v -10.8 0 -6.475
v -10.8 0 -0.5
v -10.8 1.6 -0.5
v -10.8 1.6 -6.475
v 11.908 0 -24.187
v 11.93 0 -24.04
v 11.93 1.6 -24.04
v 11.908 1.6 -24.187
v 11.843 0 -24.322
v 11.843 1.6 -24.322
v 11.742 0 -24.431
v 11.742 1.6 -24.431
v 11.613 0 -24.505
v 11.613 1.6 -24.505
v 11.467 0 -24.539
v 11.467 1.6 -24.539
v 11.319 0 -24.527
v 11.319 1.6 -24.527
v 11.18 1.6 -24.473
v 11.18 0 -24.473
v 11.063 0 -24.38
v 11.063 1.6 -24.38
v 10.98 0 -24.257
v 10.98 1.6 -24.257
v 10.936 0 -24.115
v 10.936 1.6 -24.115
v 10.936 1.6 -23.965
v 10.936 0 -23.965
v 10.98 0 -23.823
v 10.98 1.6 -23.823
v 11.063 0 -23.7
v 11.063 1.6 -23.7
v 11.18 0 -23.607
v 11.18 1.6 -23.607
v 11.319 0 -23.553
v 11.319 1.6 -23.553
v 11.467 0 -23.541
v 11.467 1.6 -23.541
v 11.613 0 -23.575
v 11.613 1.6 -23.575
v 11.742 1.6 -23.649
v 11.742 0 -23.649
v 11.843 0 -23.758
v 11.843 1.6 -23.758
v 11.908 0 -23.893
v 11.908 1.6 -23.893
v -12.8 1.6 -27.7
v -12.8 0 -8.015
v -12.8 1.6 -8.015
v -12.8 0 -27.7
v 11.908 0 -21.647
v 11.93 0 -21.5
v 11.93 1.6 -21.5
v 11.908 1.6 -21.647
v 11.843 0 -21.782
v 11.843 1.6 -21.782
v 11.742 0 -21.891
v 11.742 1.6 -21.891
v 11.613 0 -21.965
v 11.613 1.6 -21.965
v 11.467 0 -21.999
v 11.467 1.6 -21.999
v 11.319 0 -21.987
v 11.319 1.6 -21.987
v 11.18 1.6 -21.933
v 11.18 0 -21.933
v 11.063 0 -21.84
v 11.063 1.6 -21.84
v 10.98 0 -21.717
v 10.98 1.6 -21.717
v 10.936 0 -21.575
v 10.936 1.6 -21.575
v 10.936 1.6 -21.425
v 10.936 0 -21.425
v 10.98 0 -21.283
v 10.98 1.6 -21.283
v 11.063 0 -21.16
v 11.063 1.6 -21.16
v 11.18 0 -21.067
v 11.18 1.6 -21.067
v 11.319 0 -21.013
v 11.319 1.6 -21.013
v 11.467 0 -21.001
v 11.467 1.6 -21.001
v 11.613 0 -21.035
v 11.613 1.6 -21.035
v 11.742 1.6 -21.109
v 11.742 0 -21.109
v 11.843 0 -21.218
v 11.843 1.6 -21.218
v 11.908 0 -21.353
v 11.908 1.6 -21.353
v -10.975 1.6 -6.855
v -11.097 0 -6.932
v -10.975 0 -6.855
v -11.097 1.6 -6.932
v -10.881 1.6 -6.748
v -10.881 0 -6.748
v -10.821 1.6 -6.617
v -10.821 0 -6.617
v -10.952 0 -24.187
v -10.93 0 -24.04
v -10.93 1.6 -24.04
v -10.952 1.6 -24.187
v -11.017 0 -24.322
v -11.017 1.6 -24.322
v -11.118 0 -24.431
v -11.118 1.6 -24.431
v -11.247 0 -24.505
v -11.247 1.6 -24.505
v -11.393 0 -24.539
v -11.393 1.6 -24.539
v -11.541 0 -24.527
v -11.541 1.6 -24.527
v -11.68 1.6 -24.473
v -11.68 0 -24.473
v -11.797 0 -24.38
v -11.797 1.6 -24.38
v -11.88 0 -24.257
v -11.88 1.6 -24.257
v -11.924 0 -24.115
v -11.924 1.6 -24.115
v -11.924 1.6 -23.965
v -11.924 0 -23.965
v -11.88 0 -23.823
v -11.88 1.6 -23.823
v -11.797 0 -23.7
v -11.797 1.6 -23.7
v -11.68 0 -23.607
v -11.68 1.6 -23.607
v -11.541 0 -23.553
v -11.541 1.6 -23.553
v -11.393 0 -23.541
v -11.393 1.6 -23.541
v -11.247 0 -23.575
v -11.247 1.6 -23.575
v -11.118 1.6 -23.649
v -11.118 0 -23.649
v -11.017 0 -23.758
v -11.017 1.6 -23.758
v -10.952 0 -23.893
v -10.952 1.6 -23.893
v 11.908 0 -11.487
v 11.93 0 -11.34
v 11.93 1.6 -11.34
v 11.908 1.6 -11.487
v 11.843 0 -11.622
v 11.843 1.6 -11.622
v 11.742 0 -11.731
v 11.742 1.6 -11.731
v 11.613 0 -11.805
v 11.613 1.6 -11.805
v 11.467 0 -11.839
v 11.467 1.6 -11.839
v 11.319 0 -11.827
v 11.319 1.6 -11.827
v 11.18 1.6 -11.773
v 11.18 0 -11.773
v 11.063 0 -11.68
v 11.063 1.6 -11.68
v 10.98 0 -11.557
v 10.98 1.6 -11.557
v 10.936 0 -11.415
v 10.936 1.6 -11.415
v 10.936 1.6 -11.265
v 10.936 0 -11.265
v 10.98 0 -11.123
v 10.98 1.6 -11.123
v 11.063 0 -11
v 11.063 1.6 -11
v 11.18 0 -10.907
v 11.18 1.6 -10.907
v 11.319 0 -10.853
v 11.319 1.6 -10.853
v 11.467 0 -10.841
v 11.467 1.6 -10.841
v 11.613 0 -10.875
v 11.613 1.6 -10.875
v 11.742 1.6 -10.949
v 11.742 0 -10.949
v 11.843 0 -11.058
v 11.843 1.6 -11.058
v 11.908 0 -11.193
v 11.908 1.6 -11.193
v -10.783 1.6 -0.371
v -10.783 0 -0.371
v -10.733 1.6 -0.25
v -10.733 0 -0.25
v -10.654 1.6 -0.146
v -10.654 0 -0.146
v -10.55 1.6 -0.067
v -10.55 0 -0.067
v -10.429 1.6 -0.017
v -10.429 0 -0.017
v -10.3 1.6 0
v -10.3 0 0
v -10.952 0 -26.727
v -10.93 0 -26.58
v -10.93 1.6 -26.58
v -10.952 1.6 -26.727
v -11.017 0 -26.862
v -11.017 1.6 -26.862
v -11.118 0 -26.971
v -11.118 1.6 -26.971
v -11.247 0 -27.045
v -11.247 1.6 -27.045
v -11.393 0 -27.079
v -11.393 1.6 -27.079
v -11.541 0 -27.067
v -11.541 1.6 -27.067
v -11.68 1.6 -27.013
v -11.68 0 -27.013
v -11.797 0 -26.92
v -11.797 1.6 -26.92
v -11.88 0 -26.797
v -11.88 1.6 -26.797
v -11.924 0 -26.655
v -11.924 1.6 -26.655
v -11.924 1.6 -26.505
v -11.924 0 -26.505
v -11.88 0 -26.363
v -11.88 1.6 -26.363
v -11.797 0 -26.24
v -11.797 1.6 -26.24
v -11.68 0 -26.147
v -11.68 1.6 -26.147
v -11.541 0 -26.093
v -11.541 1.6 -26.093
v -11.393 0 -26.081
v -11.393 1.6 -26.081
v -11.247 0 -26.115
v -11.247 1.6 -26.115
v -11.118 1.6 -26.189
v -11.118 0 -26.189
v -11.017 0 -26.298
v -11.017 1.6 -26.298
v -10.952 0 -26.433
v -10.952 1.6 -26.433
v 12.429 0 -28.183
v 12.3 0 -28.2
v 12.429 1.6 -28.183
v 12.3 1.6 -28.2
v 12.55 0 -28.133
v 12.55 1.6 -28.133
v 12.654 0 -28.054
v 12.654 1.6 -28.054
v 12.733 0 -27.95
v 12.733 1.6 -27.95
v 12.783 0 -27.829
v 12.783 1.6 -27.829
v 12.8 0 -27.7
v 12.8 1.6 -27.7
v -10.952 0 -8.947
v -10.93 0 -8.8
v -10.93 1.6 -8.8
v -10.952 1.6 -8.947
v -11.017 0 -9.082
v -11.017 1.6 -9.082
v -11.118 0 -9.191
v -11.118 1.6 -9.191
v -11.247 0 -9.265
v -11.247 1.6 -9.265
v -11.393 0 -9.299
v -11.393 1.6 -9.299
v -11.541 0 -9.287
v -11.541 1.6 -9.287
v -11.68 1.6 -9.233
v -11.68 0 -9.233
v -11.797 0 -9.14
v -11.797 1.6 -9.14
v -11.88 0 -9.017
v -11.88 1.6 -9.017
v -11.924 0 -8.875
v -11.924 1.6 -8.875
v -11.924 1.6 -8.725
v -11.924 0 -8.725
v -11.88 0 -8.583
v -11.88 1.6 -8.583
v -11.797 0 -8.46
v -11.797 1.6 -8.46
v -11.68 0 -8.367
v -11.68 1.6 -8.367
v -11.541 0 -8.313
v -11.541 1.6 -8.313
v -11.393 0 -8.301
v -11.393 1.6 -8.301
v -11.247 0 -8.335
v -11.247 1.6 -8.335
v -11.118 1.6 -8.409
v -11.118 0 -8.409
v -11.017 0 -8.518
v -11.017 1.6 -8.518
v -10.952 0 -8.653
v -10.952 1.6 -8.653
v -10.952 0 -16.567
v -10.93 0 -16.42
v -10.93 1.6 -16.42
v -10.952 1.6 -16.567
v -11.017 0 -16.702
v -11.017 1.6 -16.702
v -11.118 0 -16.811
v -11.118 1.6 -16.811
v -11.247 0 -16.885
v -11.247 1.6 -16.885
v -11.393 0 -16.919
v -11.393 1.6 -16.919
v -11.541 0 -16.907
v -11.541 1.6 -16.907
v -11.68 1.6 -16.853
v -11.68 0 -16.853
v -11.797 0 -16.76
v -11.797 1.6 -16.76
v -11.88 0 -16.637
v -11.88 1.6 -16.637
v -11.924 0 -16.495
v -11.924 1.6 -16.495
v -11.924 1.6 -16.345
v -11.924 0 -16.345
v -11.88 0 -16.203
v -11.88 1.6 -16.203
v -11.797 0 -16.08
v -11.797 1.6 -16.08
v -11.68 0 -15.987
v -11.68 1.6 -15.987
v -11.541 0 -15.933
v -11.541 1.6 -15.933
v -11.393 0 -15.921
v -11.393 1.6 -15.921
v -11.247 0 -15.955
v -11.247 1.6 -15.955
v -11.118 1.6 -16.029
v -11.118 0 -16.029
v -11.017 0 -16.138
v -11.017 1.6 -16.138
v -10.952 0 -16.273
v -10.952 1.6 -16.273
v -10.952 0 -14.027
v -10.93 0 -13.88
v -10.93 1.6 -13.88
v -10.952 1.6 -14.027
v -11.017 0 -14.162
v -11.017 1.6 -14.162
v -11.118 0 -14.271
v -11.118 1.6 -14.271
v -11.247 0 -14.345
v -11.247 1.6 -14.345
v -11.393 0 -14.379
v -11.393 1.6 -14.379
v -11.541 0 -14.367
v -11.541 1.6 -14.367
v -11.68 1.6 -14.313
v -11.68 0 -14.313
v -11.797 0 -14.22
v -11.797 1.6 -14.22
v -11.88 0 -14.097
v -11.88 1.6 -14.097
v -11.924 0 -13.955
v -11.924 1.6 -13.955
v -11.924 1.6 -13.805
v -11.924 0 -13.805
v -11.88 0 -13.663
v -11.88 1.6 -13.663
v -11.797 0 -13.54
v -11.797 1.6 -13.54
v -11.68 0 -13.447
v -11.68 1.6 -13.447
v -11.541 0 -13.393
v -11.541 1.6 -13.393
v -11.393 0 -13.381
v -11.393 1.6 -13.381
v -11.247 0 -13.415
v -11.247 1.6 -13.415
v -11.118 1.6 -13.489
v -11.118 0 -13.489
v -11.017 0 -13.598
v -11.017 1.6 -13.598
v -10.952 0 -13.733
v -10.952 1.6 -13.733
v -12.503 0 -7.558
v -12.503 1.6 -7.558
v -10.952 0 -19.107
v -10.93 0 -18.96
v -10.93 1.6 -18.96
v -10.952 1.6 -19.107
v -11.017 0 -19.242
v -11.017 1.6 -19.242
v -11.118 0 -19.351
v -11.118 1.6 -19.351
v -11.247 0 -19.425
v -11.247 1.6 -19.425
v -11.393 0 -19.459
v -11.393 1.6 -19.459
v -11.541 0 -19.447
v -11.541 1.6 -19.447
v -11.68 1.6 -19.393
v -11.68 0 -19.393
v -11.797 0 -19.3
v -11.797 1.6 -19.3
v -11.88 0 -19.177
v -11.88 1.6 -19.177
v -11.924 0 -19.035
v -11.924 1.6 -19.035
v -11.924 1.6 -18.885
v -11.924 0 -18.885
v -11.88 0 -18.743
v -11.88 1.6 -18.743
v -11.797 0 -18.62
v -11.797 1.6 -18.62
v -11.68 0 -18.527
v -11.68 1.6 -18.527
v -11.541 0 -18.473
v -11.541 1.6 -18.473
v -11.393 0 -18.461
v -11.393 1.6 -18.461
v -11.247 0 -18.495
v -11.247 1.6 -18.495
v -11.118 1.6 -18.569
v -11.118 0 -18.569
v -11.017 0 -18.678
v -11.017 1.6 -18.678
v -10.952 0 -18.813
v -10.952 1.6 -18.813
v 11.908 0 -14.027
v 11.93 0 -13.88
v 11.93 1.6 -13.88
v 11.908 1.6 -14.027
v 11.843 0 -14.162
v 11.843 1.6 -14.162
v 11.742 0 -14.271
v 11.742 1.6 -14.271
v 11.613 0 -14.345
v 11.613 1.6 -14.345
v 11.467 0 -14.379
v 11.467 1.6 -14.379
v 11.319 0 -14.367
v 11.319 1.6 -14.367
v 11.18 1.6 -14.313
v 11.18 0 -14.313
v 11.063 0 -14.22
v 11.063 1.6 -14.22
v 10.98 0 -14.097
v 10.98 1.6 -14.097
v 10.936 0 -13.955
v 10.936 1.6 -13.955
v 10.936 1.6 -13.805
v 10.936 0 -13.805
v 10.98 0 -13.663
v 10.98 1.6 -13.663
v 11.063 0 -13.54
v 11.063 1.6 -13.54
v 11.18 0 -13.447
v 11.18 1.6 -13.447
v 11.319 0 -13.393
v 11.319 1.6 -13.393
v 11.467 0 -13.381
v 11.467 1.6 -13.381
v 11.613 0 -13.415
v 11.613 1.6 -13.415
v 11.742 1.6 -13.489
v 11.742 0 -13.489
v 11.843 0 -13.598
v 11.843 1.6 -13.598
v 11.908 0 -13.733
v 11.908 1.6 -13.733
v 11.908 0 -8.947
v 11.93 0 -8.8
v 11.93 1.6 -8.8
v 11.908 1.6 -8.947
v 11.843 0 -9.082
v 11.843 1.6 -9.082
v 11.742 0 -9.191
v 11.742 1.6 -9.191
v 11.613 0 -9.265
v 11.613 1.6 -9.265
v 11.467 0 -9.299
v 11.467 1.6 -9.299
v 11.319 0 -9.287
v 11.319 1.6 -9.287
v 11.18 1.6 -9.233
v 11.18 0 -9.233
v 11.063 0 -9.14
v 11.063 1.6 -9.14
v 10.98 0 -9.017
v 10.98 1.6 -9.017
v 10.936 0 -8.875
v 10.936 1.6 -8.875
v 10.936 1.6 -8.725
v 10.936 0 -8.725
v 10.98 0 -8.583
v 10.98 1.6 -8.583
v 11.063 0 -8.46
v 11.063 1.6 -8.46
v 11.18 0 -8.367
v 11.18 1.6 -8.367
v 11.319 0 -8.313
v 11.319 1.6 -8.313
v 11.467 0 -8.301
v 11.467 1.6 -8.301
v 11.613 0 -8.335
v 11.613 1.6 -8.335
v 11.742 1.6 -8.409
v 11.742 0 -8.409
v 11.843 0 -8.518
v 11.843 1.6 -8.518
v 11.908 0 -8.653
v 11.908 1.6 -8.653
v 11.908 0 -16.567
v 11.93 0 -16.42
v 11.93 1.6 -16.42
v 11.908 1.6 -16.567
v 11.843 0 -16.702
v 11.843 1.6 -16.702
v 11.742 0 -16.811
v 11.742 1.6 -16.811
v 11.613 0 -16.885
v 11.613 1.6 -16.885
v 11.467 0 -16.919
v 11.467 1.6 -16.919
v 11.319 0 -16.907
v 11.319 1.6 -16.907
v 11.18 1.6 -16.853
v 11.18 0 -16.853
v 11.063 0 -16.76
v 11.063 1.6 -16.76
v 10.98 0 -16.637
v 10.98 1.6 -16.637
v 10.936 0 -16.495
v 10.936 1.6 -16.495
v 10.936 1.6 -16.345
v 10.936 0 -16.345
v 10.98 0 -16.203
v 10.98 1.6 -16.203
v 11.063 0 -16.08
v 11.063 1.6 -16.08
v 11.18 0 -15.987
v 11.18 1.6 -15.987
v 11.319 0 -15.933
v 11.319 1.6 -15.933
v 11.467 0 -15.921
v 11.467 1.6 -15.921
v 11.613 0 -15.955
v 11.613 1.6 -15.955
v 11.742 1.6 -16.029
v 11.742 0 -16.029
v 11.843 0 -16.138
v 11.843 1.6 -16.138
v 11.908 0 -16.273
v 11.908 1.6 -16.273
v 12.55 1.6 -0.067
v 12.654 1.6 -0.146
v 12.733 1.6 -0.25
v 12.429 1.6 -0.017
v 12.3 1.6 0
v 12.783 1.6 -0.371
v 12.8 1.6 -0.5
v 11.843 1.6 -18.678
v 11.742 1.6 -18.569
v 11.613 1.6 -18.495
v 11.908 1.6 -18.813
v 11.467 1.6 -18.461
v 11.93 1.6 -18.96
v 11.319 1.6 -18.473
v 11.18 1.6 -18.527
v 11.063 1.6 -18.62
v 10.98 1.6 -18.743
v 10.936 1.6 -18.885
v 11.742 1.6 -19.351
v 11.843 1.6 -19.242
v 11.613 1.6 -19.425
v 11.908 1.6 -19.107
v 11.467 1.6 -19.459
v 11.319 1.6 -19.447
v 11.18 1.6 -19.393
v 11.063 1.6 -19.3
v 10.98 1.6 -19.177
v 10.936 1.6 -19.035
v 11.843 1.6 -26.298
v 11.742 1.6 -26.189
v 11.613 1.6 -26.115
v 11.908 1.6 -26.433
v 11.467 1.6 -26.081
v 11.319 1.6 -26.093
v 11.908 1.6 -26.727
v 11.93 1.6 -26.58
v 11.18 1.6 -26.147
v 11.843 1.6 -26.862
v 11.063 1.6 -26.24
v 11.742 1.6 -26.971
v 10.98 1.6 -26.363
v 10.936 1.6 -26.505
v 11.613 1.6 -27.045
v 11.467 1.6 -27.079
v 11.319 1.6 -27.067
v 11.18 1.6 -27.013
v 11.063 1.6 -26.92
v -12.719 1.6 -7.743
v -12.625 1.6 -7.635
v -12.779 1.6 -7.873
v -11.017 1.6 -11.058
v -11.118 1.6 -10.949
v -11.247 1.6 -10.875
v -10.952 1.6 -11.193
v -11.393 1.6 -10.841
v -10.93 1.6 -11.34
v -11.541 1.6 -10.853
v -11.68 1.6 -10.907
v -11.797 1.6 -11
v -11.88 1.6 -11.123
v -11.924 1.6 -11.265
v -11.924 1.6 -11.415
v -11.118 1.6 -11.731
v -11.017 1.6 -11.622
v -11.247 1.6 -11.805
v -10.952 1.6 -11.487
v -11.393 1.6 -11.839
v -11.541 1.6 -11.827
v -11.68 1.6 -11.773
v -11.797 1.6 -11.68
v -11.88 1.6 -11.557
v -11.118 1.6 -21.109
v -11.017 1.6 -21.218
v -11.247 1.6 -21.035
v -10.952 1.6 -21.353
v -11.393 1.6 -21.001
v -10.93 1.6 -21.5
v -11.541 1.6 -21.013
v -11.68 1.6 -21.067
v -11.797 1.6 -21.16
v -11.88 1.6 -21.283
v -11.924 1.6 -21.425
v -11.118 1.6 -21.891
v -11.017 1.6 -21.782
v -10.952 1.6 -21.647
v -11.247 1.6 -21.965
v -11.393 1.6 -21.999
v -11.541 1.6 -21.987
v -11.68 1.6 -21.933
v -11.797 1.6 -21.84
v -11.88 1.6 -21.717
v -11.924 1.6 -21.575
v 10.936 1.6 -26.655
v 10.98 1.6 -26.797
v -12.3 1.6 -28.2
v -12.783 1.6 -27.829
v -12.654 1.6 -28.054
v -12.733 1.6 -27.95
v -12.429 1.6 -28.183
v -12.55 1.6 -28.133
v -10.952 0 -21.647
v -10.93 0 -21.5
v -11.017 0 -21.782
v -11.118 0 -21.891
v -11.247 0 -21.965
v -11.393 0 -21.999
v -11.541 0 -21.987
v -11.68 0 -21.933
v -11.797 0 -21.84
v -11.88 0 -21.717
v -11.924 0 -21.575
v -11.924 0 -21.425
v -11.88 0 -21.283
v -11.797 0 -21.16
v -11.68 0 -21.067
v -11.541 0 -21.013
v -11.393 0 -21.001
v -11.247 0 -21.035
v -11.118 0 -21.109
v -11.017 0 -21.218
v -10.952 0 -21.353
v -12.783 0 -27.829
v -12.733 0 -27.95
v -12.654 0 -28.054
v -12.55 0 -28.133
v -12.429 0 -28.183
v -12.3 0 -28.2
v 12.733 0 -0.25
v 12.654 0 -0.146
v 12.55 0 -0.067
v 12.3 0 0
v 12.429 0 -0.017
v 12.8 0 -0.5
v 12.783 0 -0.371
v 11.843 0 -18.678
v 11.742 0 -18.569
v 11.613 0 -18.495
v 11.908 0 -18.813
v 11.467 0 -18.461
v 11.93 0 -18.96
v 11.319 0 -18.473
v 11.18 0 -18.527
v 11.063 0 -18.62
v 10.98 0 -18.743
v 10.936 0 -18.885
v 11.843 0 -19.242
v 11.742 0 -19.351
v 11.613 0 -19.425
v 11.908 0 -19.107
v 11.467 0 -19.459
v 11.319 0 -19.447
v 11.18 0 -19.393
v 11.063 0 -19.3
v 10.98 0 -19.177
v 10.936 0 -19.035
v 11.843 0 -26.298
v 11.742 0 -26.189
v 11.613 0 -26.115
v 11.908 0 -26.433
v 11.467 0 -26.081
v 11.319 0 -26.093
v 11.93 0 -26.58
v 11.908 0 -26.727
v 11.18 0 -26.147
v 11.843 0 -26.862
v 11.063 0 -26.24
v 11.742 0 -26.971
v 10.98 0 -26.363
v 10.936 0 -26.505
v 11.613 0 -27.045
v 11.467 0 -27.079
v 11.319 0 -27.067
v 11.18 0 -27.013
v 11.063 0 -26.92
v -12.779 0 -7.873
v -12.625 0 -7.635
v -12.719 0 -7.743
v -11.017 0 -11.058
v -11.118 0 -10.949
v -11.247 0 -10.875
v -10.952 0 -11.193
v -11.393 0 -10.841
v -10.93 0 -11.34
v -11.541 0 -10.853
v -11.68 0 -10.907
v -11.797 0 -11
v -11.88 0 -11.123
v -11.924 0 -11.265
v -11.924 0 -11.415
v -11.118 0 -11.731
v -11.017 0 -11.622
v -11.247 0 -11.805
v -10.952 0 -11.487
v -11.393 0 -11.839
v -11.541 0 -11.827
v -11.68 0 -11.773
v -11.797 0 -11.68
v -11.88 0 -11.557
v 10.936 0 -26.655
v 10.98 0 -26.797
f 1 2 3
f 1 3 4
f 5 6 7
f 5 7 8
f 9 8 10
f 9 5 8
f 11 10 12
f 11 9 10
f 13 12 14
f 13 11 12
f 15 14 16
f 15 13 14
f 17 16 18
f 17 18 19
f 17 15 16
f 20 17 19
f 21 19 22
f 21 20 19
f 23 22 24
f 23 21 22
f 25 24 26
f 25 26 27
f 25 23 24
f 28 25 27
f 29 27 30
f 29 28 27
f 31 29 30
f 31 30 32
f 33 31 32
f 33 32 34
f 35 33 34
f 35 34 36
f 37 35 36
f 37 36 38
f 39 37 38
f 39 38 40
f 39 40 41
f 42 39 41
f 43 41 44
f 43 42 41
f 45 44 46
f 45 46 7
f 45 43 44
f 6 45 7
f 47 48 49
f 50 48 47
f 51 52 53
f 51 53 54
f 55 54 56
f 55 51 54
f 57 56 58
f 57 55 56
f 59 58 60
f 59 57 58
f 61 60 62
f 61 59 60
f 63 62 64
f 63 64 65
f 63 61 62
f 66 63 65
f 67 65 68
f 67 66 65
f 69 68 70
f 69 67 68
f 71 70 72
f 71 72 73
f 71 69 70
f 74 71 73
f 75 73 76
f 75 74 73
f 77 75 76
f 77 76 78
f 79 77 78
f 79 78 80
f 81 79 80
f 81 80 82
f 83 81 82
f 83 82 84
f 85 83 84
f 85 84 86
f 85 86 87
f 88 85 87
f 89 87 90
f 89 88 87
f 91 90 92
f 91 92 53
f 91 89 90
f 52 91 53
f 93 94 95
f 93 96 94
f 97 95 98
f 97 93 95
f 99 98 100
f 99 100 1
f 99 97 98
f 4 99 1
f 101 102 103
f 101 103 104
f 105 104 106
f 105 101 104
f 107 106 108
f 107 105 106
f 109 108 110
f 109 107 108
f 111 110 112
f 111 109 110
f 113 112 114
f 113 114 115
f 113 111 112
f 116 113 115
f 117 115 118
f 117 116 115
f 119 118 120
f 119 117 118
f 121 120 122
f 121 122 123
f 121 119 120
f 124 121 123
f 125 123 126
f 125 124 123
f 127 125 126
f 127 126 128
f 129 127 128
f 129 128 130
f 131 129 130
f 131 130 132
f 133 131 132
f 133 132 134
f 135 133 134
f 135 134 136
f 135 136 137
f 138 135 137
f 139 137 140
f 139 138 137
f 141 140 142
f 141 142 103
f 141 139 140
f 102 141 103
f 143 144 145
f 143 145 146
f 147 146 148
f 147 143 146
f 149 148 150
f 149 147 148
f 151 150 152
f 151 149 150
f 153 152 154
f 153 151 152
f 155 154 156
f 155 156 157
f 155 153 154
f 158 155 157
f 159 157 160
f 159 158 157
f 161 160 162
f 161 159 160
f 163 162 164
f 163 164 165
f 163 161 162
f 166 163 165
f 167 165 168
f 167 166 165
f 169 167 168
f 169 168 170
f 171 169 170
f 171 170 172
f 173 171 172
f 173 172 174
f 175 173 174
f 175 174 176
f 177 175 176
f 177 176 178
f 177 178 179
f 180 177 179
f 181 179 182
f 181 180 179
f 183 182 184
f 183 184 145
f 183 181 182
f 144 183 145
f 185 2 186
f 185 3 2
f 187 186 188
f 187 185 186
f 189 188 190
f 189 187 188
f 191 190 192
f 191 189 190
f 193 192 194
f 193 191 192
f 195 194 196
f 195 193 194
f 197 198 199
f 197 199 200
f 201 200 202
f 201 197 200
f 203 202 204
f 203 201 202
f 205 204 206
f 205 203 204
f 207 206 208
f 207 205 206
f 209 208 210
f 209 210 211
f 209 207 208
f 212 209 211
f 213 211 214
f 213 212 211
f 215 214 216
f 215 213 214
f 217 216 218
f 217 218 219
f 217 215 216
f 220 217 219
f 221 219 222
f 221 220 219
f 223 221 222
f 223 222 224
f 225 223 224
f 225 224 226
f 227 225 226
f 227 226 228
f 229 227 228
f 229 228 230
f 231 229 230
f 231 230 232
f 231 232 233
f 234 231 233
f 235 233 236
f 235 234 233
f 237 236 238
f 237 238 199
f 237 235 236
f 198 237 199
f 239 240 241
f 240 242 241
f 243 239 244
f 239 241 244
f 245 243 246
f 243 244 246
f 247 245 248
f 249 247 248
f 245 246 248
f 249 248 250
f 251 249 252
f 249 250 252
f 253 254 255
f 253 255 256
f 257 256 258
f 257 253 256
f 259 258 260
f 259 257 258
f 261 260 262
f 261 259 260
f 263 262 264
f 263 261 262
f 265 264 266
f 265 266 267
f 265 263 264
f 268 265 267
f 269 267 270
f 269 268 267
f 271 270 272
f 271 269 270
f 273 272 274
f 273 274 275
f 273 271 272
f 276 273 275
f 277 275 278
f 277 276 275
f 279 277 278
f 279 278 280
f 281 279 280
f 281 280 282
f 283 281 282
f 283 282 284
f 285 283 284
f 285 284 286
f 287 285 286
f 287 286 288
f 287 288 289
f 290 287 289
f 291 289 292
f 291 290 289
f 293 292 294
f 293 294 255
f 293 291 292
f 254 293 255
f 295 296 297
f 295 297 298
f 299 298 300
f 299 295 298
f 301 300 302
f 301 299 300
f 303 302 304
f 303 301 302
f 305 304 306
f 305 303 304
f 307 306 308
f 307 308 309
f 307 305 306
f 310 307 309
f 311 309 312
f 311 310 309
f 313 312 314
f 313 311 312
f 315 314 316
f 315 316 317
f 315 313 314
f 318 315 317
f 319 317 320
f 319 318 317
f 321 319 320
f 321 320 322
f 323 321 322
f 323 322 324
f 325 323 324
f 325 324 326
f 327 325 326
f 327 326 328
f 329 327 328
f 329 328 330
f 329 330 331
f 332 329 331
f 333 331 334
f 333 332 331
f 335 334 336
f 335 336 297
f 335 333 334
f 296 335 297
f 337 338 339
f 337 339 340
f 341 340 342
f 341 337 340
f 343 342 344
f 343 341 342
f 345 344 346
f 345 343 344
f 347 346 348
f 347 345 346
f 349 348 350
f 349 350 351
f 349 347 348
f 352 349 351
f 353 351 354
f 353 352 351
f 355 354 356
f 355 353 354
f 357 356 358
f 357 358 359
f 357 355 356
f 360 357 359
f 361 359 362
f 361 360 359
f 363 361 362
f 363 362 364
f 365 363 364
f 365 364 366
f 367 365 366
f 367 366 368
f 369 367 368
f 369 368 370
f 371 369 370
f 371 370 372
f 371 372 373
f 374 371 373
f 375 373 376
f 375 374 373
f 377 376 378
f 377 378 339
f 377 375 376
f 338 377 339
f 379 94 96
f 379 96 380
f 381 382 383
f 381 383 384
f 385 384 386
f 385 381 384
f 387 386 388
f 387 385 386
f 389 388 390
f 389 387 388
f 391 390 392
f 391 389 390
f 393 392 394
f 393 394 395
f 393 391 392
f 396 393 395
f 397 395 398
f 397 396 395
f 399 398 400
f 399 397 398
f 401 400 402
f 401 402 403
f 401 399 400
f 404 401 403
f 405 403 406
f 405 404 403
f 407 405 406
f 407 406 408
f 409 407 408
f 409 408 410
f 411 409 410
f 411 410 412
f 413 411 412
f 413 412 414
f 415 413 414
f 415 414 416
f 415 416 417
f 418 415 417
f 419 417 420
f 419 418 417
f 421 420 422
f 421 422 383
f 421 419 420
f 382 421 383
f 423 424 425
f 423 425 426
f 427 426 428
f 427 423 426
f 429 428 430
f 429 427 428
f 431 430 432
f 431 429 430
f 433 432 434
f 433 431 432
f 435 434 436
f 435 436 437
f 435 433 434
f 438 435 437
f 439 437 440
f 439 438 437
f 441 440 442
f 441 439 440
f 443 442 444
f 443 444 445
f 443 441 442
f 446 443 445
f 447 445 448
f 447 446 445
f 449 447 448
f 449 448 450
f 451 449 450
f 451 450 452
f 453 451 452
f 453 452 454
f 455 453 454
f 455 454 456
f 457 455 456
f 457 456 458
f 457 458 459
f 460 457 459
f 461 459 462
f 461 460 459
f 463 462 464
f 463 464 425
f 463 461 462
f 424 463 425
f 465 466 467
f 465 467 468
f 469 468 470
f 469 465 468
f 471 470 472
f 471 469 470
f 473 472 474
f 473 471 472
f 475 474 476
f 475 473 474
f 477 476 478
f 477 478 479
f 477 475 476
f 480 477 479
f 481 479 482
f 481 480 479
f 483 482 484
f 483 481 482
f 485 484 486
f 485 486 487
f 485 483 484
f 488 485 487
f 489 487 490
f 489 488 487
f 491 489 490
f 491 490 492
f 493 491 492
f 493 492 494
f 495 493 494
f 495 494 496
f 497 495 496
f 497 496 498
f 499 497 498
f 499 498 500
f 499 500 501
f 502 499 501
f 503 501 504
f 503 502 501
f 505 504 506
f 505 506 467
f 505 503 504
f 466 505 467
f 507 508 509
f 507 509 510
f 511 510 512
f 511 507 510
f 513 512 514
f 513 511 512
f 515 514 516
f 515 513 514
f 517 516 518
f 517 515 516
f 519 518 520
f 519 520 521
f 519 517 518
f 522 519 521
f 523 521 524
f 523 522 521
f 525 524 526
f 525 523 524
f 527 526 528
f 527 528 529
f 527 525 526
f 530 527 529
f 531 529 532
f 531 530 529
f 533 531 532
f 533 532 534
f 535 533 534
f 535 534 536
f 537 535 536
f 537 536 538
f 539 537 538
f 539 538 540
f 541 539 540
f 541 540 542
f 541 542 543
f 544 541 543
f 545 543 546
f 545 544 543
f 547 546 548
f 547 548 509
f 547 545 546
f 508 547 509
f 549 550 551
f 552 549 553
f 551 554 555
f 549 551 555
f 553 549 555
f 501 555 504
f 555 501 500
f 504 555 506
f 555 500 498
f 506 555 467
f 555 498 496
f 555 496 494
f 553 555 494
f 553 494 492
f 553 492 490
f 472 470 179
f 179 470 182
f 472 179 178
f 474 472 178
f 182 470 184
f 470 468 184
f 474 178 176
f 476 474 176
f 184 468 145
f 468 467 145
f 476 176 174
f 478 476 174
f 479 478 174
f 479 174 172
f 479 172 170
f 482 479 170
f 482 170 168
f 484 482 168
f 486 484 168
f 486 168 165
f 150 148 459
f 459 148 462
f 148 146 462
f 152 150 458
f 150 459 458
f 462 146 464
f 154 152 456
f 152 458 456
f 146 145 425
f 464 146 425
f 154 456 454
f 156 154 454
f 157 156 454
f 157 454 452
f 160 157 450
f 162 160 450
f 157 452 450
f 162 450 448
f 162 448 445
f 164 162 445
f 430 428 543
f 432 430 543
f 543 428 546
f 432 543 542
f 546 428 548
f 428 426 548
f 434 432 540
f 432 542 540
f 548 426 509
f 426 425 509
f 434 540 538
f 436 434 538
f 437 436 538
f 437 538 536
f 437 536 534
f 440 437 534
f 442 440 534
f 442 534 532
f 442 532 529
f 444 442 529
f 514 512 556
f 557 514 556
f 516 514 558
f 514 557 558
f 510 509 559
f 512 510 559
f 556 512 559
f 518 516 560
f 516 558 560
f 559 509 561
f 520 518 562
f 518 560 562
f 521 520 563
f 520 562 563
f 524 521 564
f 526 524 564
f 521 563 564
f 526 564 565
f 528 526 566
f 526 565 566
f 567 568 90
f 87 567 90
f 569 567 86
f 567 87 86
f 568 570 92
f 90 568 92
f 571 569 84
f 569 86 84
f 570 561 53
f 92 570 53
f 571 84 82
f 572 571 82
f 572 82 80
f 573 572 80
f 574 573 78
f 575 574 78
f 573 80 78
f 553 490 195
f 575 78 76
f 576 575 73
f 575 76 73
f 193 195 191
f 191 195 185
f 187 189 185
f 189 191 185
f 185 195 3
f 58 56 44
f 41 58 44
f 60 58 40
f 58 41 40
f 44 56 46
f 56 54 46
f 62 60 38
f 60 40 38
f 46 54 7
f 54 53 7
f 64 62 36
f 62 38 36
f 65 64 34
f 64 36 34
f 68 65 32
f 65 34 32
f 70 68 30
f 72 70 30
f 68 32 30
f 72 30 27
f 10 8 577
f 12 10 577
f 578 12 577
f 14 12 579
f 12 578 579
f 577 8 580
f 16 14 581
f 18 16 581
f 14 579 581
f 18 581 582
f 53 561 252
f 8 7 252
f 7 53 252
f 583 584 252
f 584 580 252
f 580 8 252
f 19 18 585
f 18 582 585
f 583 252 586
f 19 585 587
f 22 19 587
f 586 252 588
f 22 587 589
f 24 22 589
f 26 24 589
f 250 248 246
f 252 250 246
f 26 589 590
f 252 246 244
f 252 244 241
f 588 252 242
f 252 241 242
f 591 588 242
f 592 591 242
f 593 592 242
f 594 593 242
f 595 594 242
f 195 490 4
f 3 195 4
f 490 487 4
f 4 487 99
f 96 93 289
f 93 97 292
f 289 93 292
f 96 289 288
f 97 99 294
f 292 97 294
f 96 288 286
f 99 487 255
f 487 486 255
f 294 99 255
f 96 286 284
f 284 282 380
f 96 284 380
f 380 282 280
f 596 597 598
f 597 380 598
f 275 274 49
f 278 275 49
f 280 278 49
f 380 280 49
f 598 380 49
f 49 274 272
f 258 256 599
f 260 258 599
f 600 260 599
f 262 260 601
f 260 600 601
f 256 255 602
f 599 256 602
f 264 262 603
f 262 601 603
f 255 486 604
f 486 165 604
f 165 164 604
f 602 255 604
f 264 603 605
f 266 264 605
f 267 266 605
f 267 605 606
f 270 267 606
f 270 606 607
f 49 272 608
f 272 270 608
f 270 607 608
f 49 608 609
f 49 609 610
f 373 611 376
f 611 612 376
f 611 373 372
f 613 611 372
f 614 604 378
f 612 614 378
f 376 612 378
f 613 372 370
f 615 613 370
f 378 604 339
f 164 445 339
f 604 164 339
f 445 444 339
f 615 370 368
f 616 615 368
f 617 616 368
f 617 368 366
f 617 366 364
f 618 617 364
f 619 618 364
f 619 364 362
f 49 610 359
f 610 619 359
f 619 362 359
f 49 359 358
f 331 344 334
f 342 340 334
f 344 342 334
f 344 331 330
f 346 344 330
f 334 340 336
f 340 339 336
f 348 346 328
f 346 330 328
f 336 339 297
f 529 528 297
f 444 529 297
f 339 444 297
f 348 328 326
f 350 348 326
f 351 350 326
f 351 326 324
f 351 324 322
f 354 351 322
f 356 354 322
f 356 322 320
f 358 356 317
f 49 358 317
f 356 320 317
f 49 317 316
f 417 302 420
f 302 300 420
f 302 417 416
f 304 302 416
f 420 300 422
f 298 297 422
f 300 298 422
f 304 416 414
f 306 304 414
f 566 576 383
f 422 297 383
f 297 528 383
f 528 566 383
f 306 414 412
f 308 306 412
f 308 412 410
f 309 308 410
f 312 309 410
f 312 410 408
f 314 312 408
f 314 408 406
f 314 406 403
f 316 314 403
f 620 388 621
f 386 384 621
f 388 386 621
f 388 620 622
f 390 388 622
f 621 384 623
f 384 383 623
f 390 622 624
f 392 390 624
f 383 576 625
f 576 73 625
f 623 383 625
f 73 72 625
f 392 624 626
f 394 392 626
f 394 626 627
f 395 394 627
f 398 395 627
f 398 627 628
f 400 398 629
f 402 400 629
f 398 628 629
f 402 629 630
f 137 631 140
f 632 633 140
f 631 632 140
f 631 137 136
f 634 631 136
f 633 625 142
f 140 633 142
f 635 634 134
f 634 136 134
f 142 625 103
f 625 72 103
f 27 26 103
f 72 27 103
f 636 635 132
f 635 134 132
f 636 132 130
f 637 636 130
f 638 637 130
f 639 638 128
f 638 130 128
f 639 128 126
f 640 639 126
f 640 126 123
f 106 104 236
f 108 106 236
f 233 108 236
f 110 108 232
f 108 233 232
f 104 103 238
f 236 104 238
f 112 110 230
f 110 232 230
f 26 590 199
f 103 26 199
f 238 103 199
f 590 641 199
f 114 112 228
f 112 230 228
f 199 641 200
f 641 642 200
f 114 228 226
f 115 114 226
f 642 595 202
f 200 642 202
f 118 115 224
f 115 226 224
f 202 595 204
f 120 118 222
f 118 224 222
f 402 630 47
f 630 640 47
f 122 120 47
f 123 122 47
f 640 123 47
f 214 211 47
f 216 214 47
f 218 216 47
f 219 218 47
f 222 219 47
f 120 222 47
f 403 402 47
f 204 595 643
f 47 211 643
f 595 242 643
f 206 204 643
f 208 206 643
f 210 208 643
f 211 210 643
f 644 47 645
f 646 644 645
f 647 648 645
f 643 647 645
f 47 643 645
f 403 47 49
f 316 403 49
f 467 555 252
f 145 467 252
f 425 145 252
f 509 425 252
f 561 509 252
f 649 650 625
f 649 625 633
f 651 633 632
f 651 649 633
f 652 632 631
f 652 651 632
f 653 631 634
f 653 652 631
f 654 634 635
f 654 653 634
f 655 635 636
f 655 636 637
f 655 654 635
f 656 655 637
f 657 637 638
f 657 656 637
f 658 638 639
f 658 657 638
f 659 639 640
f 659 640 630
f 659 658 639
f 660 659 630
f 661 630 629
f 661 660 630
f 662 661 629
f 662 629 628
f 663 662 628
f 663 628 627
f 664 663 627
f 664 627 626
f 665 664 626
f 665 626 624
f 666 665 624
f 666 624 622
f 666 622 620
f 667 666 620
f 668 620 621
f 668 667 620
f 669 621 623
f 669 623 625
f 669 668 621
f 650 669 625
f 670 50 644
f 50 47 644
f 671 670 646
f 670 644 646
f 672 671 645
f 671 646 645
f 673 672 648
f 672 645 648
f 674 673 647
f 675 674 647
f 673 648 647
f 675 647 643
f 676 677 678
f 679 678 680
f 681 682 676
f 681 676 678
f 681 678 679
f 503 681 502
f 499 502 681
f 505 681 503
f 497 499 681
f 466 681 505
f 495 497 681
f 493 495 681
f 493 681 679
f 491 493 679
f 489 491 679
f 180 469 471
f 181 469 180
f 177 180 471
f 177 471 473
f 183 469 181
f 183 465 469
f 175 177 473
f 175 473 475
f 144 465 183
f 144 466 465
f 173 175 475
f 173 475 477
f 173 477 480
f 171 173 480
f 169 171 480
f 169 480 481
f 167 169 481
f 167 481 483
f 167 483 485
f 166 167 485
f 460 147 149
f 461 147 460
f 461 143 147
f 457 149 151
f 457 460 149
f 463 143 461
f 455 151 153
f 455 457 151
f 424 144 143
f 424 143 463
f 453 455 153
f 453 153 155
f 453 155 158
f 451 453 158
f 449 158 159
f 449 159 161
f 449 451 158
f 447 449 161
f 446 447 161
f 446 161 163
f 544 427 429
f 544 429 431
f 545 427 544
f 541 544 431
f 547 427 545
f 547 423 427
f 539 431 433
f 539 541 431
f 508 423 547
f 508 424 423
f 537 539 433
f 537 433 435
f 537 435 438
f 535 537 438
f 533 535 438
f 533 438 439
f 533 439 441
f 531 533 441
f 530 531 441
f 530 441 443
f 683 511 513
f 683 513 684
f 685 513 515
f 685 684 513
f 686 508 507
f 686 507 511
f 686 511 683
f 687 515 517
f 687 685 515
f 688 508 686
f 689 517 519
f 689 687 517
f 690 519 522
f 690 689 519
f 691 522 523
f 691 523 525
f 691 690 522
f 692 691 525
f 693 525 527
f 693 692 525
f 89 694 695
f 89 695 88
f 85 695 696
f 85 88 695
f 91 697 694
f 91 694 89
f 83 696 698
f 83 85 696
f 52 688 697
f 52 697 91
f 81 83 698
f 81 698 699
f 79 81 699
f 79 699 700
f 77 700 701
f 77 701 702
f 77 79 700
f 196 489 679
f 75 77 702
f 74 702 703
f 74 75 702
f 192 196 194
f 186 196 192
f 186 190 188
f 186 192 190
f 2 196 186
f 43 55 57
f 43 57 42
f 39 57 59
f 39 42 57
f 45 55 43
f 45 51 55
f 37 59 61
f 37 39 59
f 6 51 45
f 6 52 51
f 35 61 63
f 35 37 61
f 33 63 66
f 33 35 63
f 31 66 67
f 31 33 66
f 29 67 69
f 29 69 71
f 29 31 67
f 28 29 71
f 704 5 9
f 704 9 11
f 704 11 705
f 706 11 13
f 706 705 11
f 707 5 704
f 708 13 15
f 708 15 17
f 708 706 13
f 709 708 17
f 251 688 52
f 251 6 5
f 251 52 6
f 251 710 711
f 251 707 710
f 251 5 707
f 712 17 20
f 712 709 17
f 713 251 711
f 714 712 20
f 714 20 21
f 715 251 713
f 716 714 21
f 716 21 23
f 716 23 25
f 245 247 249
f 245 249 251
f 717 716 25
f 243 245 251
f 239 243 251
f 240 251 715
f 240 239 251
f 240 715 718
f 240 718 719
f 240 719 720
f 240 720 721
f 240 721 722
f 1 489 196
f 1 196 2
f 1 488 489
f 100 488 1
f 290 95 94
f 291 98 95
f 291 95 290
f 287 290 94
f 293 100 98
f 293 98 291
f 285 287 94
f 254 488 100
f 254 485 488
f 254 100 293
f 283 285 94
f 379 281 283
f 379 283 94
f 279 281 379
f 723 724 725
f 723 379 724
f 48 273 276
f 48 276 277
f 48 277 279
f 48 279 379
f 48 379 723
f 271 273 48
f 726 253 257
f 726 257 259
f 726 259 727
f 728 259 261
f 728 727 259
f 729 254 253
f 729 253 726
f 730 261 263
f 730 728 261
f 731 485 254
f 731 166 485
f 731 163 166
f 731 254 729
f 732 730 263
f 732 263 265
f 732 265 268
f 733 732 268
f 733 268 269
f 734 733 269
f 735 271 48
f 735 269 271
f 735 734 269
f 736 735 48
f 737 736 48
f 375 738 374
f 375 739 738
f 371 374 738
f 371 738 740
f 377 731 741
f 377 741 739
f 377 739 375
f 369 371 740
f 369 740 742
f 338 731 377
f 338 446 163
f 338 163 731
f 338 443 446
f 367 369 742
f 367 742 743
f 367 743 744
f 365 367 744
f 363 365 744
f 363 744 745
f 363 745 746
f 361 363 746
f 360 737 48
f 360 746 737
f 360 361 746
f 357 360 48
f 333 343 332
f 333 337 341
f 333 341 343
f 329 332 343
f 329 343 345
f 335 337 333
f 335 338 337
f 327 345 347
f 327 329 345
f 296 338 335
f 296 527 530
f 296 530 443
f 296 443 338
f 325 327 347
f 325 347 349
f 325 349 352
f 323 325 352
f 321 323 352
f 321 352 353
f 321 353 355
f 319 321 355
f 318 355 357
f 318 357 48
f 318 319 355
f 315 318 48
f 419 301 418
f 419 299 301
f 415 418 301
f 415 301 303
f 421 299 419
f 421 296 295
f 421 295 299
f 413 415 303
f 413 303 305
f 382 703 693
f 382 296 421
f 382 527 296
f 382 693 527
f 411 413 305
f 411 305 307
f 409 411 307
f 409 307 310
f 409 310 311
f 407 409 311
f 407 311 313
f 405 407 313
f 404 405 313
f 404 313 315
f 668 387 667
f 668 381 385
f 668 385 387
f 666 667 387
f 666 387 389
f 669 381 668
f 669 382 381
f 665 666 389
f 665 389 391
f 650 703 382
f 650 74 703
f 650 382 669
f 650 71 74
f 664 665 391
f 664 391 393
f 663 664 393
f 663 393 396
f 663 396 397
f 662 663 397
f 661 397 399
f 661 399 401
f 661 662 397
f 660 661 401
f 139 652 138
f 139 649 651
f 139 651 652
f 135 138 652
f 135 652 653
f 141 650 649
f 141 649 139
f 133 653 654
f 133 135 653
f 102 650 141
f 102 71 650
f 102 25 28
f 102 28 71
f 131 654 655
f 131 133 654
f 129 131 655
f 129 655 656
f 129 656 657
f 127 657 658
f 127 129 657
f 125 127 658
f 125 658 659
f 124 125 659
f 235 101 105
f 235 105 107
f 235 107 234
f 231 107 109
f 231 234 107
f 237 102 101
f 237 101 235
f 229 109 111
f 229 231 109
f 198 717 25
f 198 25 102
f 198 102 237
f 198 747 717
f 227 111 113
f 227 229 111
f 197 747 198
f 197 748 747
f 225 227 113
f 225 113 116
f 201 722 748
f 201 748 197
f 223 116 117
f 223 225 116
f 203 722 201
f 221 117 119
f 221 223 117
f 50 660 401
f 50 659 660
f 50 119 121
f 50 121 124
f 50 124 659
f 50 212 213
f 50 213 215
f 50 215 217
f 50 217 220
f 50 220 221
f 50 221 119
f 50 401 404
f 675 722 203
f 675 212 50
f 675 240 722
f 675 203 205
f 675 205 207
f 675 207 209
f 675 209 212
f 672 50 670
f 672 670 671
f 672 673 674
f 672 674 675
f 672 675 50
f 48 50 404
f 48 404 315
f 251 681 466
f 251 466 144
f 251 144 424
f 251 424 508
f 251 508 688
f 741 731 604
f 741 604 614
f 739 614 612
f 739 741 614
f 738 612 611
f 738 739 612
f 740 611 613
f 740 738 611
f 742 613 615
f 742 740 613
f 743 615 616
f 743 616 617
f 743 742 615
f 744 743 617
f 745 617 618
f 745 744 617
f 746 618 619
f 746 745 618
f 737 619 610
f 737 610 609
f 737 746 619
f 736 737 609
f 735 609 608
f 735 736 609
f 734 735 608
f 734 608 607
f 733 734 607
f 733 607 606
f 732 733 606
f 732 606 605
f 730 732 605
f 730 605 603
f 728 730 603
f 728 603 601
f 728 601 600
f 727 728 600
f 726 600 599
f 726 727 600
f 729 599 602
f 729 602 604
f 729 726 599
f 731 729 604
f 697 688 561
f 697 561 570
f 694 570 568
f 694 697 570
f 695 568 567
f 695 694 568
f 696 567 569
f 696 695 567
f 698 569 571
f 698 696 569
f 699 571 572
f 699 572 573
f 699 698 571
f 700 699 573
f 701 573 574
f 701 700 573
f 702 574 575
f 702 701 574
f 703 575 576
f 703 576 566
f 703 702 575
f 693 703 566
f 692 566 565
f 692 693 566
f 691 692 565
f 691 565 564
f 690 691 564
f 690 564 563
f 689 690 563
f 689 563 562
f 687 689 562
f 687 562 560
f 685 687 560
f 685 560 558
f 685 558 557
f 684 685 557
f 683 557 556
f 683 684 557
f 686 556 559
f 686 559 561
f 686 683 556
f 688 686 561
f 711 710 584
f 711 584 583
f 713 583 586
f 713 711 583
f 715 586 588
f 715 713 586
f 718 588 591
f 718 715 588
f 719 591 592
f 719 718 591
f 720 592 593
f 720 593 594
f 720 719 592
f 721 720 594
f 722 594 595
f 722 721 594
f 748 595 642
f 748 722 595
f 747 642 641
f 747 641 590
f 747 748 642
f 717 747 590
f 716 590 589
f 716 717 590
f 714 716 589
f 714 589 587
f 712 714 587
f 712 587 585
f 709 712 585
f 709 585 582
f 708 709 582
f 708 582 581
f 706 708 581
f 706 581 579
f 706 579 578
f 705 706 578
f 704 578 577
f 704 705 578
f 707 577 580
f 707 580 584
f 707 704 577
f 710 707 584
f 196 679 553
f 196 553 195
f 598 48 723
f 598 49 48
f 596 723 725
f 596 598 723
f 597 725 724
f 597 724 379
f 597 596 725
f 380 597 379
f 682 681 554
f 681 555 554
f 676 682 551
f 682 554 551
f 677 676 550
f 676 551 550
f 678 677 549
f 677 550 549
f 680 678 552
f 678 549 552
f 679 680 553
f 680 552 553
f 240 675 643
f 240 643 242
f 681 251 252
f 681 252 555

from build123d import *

# Parameters (mm, degrees)
SKETCH2_R           = 0.5
BOSS_EXTRUDE1_DEPTH = 1.6
FILLET1_R           = 0.5


with BuildPart() as part:
    # Sketch2 → Boss-Extrude1 (new body)
    with BuildSketch(Plane(origin=(0, 0, 0), x_dir=(1, 0, 0), z_dir=(0, 1, 0))):
        Polygon((-12.8, 7.690457371), (-12.8, 28.2), (12.8, 28.2), (12.8, 0), (-10.8, 0), (-10.8, 6.8), align=None)
        with Locations((-11.43, 26.58)):
            Circle(SKETCH2_R, mode=Mode.SUBTRACT)
        with Locations((11.43, 26.58)):
            Circle(SKETCH2_R, mode=Mode.SUBTRACT)
        with Locations((-11.43, 24.04)):
            Circle(SKETCH2_R, mode=Mode.SUBTRACT)
        with Locations((11.43, 24.04)):
            Circle(SKETCH2_R, mode=Mode.SUBTRACT)
        with Locations((-11.43, 21.5)):
            Circle(SKETCH2_R, mode=Mode.SUBTRACT)
        with Locations((11.43, 21.5)):
            Circle(SKETCH2_R, mode=Mode.SUBTRACT)
        with Locations((-11.43, 18.96)):
            Circle(SKETCH2_R, mode=Mode.SUBTRACT)
        with Locations((11.43, 18.96)):
            Circle(SKETCH2_R, mode=Mode.SUBTRACT)
        with Locations((-11.43, 16.42)):
            Circle(SKETCH2_R, mode=Mode.SUBTRACT)
        with Locations((11.43, 16.42)):
            Circle(SKETCH2_R, mode=Mode.SUBTRACT)
        with Locations((-11.43, 13.88)):
            Circle(SKETCH2_R, mode=Mode.SUBTRACT)
        with Locations((11.43, 13.88)):
            Circle(SKETCH2_R, mode=Mode.SUBTRACT)
        with Locations((-11.43, 11.34)):
            Circle(SKETCH2_R, mode=Mode.SUBTRACT)
        with Locations((11.43, 11.34)):
            Circle(SKETCH2_R, mode=Mode.SUBTRACT)
        with Locations((-11.43, 8.8)):
            Circle(SKETCH2_R, mode=Mode.SUBTRACT)
        with Locations((11.43, 8.8)):
            Circle(SKETCH2_R, mode=Mode.SUBTRACT)
    extrude(amount=BOSS_EXTRUDE1_DEPTH)

    # Fillet1
    fillet1_edges = [part.edges().sort_by_distance(p)[0] for p in [
        (12.8, 0.8, 0),
        (-10.8, 0.8, 0),
        (-10.8, 0.8, -6.8),
        (-12.8, 0.8, -7.690457371),
        (-12.8, 0.8, -28.2),
        (12.8, 0.8, -28.2),
    ]]
    fillet(fillet1_edges, radius=FILLET1_R)


solid = part.part
